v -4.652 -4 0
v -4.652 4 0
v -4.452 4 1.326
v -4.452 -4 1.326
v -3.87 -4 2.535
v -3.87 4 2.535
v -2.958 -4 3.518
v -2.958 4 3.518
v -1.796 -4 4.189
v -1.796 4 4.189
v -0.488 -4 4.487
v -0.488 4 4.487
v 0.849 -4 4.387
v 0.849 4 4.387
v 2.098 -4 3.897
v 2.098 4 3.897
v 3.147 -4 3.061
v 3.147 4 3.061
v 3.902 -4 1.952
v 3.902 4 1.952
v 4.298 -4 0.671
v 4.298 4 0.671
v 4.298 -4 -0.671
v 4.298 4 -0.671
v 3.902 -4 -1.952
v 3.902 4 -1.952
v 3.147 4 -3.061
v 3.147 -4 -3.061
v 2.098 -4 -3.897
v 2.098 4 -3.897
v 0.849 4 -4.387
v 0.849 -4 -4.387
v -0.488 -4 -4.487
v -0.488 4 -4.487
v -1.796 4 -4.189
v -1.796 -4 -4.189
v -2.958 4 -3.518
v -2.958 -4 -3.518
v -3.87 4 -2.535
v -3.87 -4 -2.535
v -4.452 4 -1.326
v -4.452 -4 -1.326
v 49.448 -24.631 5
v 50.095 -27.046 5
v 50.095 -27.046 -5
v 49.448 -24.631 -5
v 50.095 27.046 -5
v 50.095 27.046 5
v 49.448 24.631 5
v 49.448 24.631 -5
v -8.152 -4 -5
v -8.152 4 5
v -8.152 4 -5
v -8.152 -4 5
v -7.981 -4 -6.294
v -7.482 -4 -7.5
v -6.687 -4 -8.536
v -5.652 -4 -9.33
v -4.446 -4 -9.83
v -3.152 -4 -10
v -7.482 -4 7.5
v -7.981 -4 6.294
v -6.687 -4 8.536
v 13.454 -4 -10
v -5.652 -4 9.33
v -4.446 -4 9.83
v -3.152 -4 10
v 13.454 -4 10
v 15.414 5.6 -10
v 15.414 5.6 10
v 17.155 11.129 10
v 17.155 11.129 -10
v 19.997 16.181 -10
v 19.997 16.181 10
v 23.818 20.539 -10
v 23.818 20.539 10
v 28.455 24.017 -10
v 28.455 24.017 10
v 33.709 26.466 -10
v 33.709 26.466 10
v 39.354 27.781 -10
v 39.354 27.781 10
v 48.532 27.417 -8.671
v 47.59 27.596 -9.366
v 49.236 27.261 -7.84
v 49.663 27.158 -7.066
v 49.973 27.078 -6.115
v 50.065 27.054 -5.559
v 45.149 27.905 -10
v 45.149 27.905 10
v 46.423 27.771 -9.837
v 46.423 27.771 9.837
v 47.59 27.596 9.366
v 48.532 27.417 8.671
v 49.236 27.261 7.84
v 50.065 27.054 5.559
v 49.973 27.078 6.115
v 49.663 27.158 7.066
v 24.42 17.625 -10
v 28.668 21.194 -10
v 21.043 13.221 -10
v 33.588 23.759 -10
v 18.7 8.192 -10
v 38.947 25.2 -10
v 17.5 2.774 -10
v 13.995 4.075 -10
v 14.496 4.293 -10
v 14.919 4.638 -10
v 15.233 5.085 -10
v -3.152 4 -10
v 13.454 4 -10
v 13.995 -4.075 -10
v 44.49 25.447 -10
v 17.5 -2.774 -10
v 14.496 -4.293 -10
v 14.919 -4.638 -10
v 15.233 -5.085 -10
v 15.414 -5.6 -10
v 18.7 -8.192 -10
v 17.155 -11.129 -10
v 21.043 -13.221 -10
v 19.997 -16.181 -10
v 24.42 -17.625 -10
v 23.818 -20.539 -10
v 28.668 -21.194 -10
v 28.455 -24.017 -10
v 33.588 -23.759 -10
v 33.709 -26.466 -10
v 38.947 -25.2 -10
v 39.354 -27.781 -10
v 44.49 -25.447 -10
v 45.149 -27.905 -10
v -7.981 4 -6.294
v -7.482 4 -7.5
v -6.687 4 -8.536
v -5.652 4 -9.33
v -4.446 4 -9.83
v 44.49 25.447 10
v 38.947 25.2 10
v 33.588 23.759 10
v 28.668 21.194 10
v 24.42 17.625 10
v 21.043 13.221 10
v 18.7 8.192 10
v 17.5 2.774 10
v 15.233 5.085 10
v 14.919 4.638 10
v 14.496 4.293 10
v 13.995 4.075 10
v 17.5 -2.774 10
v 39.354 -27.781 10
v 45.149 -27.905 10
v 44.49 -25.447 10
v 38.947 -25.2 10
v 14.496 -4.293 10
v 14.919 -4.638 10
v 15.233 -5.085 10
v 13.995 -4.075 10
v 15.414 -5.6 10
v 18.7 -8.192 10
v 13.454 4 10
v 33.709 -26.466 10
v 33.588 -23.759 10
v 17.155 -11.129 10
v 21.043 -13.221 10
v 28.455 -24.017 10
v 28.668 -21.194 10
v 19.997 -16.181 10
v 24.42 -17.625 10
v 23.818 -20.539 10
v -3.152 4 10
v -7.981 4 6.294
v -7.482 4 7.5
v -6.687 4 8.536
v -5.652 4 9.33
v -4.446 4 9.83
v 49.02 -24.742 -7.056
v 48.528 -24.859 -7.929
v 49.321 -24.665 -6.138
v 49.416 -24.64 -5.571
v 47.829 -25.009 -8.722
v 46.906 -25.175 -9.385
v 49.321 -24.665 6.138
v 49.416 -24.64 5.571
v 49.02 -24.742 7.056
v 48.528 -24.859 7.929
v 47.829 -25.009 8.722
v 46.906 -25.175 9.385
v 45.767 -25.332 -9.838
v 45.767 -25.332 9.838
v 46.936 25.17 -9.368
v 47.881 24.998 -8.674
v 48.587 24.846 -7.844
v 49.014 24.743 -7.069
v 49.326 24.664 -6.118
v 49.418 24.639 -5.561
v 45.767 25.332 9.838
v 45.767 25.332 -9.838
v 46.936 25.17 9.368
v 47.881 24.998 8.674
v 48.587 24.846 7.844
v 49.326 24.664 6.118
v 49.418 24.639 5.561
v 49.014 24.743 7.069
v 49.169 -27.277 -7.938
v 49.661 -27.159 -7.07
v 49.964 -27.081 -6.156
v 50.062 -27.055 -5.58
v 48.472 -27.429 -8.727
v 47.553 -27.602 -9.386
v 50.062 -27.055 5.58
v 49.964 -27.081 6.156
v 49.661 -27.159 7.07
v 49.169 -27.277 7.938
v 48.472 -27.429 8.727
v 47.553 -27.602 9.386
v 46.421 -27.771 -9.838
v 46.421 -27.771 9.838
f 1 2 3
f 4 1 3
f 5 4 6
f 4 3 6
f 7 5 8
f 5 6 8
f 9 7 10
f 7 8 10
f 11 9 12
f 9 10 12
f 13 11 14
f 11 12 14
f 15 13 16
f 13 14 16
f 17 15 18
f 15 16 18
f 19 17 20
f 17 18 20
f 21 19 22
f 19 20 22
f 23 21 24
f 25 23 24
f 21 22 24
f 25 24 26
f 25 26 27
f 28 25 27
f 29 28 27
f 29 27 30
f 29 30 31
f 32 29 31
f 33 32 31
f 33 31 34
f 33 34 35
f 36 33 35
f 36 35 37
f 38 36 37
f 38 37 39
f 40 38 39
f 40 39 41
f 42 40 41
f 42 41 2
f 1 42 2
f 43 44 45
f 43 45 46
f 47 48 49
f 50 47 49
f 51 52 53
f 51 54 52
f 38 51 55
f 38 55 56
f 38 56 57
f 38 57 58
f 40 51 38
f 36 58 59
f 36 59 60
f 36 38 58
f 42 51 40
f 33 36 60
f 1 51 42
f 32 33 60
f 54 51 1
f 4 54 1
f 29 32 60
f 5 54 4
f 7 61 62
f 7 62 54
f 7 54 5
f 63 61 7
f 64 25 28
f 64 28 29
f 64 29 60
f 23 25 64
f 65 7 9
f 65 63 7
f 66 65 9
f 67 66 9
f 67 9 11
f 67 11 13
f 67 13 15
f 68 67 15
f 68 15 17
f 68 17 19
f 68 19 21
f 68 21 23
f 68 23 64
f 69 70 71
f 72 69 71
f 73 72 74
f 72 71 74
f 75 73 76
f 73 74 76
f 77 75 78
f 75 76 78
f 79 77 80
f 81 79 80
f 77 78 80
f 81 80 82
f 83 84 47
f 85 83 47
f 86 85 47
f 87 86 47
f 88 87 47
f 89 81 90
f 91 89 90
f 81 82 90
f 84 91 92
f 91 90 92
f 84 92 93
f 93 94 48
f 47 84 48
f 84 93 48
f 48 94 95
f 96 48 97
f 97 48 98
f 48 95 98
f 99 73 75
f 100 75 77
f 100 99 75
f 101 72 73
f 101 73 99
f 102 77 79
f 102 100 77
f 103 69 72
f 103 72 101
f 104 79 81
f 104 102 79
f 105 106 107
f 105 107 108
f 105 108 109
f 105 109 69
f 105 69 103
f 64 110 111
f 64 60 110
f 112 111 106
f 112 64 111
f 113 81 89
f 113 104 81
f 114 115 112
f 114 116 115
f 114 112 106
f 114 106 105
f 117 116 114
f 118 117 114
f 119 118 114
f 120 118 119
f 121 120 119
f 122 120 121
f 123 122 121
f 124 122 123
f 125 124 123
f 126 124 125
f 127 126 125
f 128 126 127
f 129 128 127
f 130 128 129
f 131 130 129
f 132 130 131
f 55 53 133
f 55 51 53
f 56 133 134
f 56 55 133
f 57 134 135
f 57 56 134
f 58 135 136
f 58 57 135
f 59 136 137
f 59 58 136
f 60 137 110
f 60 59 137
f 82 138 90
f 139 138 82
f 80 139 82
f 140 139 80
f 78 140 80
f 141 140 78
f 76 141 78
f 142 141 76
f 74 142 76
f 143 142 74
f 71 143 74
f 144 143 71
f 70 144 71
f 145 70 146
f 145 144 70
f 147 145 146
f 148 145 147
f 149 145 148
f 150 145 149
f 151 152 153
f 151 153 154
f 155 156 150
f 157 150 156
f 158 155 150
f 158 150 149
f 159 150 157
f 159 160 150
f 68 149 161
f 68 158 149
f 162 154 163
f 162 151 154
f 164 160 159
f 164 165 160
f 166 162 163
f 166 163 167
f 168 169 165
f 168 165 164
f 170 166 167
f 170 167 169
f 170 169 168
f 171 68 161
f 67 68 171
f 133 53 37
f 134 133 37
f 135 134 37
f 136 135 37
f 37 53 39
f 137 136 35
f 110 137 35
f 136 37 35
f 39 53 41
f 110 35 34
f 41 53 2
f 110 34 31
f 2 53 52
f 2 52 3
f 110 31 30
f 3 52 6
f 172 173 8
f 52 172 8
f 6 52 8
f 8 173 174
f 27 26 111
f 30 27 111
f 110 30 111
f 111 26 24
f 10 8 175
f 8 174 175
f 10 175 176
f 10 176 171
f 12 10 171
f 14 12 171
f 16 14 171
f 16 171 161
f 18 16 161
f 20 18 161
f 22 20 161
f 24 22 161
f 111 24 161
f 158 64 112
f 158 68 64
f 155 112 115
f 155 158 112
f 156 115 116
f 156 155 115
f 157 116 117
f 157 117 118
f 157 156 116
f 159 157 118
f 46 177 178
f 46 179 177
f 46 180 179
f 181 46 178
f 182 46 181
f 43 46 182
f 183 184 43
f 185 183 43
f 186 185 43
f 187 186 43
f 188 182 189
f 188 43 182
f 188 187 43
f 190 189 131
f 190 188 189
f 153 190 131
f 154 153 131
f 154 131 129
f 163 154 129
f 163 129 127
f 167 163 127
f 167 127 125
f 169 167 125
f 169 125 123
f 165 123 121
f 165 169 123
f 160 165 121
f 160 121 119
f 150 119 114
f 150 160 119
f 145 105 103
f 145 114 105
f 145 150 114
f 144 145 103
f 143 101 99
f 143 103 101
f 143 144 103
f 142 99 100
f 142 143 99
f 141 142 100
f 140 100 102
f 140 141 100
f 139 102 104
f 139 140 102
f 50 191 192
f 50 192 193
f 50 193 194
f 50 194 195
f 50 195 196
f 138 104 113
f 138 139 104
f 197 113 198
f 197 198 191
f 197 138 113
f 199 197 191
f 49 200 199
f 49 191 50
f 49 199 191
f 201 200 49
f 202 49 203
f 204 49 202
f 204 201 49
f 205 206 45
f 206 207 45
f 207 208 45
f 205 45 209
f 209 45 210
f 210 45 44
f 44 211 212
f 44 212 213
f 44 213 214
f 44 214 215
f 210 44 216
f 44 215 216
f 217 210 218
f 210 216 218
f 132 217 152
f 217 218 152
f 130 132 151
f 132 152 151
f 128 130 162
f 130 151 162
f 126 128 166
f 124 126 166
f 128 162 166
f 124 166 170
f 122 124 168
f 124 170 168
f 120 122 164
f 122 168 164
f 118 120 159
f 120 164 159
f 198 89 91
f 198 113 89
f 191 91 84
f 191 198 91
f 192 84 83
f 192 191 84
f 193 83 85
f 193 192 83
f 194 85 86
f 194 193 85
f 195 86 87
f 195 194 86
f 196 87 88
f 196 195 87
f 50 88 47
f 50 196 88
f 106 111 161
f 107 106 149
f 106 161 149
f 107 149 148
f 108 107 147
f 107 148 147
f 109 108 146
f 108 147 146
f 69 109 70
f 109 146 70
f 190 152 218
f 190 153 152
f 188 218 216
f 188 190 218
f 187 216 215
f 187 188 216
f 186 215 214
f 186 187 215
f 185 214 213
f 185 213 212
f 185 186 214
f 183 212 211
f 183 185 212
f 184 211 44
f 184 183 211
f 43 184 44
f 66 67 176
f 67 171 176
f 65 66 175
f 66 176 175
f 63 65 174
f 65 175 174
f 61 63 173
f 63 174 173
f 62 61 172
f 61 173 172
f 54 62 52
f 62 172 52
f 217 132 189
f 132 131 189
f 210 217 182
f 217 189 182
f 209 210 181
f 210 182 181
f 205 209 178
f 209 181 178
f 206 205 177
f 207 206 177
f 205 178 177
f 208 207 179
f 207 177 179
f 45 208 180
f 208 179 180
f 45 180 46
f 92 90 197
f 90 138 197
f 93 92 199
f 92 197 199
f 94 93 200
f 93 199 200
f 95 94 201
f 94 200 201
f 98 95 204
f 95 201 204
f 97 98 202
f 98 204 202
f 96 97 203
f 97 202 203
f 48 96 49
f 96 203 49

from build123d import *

# Parameters (mm, degrees)
F0_W          = 2.5
F0_H          = 20
F1_ANGLE_BACK = 105
F1_ANGLE      = 210
F2_DEPTH      = 4
F4_D          = 9
F5_R          = 2
F6_R          = 5
F7_R          = 5


# Not quite as in the source:
# - a feature names something its author has since deleted; it is built from what else it names


with BuildPart() as f1:
    # F0 (on Front) → F1 (revolve)
    with BuildSketch(Plane.XZ, mode=Mode.PRIVATE) as f1_sk:
        with Locations((16.0981313139, 0)):
            Rectangle(F0_W, F0_H)
    revolve(f1_sk.sketch.rotate(Axis((42.8481313139, 0, -3.3182863891), (0, 0, -1)), -F1_ANGLE_BACK), axis=Axis((42.8481313139, 0, -3.3182863891), (0, 0, -1)), revolution_arc=F1_ANGLE)

    # F0 (on Front) → F2 (join, symmetric)
    with BuildSketch(Plane.XZ):
        Polygon((14.8481313139, -10), (14.8481313139, 10), (-0.1518686861, 10), (-8.1518686861, 10), (-8.1518686861, -1.747650138), (-8.1518686861, -10), (-0.1518686861, -10), align=None)
        with Locations((16.0981313139, 0)):
            Rectangle(F0_W, F0_H)
    extrude(amount=F2_DEPTH, both=True)

    # F4 (through all)
    with Locations(Plane.XZ.offset(4)):
        with Locations((-0.1518686861, 0)):
            Hole(F4_D / 2)

    # F5
    f5_edges = [f1.edges().sort_by_distance(p)[0] for p in [
        (15.135318, -4, 0),
        (15.135318, 4, 0),
    ]]
    fillet(f5_edges, radius=F5_R)

    # F6
    f6_edges = [f1.edges().sort_by_distance(p)[0] for p in [
        (49.771541, -25.838516, 10),
        (49.771541, -25.838516, -10),
        (49.771541, 25.838516, -10),
        (49.771541, 25.838516, 10),
    ]]
    fillet(f6_edges, radius=F6_R)

    # F7
    f7_edges = [f1.edges().sort_by_distance(p)[0] for p in [
        (-8.151869, 0, 10),
        (-8.151869, 0, -10),
    ]]
    fillet(f7_edges, radius=F7_R)


solid = f1.part
